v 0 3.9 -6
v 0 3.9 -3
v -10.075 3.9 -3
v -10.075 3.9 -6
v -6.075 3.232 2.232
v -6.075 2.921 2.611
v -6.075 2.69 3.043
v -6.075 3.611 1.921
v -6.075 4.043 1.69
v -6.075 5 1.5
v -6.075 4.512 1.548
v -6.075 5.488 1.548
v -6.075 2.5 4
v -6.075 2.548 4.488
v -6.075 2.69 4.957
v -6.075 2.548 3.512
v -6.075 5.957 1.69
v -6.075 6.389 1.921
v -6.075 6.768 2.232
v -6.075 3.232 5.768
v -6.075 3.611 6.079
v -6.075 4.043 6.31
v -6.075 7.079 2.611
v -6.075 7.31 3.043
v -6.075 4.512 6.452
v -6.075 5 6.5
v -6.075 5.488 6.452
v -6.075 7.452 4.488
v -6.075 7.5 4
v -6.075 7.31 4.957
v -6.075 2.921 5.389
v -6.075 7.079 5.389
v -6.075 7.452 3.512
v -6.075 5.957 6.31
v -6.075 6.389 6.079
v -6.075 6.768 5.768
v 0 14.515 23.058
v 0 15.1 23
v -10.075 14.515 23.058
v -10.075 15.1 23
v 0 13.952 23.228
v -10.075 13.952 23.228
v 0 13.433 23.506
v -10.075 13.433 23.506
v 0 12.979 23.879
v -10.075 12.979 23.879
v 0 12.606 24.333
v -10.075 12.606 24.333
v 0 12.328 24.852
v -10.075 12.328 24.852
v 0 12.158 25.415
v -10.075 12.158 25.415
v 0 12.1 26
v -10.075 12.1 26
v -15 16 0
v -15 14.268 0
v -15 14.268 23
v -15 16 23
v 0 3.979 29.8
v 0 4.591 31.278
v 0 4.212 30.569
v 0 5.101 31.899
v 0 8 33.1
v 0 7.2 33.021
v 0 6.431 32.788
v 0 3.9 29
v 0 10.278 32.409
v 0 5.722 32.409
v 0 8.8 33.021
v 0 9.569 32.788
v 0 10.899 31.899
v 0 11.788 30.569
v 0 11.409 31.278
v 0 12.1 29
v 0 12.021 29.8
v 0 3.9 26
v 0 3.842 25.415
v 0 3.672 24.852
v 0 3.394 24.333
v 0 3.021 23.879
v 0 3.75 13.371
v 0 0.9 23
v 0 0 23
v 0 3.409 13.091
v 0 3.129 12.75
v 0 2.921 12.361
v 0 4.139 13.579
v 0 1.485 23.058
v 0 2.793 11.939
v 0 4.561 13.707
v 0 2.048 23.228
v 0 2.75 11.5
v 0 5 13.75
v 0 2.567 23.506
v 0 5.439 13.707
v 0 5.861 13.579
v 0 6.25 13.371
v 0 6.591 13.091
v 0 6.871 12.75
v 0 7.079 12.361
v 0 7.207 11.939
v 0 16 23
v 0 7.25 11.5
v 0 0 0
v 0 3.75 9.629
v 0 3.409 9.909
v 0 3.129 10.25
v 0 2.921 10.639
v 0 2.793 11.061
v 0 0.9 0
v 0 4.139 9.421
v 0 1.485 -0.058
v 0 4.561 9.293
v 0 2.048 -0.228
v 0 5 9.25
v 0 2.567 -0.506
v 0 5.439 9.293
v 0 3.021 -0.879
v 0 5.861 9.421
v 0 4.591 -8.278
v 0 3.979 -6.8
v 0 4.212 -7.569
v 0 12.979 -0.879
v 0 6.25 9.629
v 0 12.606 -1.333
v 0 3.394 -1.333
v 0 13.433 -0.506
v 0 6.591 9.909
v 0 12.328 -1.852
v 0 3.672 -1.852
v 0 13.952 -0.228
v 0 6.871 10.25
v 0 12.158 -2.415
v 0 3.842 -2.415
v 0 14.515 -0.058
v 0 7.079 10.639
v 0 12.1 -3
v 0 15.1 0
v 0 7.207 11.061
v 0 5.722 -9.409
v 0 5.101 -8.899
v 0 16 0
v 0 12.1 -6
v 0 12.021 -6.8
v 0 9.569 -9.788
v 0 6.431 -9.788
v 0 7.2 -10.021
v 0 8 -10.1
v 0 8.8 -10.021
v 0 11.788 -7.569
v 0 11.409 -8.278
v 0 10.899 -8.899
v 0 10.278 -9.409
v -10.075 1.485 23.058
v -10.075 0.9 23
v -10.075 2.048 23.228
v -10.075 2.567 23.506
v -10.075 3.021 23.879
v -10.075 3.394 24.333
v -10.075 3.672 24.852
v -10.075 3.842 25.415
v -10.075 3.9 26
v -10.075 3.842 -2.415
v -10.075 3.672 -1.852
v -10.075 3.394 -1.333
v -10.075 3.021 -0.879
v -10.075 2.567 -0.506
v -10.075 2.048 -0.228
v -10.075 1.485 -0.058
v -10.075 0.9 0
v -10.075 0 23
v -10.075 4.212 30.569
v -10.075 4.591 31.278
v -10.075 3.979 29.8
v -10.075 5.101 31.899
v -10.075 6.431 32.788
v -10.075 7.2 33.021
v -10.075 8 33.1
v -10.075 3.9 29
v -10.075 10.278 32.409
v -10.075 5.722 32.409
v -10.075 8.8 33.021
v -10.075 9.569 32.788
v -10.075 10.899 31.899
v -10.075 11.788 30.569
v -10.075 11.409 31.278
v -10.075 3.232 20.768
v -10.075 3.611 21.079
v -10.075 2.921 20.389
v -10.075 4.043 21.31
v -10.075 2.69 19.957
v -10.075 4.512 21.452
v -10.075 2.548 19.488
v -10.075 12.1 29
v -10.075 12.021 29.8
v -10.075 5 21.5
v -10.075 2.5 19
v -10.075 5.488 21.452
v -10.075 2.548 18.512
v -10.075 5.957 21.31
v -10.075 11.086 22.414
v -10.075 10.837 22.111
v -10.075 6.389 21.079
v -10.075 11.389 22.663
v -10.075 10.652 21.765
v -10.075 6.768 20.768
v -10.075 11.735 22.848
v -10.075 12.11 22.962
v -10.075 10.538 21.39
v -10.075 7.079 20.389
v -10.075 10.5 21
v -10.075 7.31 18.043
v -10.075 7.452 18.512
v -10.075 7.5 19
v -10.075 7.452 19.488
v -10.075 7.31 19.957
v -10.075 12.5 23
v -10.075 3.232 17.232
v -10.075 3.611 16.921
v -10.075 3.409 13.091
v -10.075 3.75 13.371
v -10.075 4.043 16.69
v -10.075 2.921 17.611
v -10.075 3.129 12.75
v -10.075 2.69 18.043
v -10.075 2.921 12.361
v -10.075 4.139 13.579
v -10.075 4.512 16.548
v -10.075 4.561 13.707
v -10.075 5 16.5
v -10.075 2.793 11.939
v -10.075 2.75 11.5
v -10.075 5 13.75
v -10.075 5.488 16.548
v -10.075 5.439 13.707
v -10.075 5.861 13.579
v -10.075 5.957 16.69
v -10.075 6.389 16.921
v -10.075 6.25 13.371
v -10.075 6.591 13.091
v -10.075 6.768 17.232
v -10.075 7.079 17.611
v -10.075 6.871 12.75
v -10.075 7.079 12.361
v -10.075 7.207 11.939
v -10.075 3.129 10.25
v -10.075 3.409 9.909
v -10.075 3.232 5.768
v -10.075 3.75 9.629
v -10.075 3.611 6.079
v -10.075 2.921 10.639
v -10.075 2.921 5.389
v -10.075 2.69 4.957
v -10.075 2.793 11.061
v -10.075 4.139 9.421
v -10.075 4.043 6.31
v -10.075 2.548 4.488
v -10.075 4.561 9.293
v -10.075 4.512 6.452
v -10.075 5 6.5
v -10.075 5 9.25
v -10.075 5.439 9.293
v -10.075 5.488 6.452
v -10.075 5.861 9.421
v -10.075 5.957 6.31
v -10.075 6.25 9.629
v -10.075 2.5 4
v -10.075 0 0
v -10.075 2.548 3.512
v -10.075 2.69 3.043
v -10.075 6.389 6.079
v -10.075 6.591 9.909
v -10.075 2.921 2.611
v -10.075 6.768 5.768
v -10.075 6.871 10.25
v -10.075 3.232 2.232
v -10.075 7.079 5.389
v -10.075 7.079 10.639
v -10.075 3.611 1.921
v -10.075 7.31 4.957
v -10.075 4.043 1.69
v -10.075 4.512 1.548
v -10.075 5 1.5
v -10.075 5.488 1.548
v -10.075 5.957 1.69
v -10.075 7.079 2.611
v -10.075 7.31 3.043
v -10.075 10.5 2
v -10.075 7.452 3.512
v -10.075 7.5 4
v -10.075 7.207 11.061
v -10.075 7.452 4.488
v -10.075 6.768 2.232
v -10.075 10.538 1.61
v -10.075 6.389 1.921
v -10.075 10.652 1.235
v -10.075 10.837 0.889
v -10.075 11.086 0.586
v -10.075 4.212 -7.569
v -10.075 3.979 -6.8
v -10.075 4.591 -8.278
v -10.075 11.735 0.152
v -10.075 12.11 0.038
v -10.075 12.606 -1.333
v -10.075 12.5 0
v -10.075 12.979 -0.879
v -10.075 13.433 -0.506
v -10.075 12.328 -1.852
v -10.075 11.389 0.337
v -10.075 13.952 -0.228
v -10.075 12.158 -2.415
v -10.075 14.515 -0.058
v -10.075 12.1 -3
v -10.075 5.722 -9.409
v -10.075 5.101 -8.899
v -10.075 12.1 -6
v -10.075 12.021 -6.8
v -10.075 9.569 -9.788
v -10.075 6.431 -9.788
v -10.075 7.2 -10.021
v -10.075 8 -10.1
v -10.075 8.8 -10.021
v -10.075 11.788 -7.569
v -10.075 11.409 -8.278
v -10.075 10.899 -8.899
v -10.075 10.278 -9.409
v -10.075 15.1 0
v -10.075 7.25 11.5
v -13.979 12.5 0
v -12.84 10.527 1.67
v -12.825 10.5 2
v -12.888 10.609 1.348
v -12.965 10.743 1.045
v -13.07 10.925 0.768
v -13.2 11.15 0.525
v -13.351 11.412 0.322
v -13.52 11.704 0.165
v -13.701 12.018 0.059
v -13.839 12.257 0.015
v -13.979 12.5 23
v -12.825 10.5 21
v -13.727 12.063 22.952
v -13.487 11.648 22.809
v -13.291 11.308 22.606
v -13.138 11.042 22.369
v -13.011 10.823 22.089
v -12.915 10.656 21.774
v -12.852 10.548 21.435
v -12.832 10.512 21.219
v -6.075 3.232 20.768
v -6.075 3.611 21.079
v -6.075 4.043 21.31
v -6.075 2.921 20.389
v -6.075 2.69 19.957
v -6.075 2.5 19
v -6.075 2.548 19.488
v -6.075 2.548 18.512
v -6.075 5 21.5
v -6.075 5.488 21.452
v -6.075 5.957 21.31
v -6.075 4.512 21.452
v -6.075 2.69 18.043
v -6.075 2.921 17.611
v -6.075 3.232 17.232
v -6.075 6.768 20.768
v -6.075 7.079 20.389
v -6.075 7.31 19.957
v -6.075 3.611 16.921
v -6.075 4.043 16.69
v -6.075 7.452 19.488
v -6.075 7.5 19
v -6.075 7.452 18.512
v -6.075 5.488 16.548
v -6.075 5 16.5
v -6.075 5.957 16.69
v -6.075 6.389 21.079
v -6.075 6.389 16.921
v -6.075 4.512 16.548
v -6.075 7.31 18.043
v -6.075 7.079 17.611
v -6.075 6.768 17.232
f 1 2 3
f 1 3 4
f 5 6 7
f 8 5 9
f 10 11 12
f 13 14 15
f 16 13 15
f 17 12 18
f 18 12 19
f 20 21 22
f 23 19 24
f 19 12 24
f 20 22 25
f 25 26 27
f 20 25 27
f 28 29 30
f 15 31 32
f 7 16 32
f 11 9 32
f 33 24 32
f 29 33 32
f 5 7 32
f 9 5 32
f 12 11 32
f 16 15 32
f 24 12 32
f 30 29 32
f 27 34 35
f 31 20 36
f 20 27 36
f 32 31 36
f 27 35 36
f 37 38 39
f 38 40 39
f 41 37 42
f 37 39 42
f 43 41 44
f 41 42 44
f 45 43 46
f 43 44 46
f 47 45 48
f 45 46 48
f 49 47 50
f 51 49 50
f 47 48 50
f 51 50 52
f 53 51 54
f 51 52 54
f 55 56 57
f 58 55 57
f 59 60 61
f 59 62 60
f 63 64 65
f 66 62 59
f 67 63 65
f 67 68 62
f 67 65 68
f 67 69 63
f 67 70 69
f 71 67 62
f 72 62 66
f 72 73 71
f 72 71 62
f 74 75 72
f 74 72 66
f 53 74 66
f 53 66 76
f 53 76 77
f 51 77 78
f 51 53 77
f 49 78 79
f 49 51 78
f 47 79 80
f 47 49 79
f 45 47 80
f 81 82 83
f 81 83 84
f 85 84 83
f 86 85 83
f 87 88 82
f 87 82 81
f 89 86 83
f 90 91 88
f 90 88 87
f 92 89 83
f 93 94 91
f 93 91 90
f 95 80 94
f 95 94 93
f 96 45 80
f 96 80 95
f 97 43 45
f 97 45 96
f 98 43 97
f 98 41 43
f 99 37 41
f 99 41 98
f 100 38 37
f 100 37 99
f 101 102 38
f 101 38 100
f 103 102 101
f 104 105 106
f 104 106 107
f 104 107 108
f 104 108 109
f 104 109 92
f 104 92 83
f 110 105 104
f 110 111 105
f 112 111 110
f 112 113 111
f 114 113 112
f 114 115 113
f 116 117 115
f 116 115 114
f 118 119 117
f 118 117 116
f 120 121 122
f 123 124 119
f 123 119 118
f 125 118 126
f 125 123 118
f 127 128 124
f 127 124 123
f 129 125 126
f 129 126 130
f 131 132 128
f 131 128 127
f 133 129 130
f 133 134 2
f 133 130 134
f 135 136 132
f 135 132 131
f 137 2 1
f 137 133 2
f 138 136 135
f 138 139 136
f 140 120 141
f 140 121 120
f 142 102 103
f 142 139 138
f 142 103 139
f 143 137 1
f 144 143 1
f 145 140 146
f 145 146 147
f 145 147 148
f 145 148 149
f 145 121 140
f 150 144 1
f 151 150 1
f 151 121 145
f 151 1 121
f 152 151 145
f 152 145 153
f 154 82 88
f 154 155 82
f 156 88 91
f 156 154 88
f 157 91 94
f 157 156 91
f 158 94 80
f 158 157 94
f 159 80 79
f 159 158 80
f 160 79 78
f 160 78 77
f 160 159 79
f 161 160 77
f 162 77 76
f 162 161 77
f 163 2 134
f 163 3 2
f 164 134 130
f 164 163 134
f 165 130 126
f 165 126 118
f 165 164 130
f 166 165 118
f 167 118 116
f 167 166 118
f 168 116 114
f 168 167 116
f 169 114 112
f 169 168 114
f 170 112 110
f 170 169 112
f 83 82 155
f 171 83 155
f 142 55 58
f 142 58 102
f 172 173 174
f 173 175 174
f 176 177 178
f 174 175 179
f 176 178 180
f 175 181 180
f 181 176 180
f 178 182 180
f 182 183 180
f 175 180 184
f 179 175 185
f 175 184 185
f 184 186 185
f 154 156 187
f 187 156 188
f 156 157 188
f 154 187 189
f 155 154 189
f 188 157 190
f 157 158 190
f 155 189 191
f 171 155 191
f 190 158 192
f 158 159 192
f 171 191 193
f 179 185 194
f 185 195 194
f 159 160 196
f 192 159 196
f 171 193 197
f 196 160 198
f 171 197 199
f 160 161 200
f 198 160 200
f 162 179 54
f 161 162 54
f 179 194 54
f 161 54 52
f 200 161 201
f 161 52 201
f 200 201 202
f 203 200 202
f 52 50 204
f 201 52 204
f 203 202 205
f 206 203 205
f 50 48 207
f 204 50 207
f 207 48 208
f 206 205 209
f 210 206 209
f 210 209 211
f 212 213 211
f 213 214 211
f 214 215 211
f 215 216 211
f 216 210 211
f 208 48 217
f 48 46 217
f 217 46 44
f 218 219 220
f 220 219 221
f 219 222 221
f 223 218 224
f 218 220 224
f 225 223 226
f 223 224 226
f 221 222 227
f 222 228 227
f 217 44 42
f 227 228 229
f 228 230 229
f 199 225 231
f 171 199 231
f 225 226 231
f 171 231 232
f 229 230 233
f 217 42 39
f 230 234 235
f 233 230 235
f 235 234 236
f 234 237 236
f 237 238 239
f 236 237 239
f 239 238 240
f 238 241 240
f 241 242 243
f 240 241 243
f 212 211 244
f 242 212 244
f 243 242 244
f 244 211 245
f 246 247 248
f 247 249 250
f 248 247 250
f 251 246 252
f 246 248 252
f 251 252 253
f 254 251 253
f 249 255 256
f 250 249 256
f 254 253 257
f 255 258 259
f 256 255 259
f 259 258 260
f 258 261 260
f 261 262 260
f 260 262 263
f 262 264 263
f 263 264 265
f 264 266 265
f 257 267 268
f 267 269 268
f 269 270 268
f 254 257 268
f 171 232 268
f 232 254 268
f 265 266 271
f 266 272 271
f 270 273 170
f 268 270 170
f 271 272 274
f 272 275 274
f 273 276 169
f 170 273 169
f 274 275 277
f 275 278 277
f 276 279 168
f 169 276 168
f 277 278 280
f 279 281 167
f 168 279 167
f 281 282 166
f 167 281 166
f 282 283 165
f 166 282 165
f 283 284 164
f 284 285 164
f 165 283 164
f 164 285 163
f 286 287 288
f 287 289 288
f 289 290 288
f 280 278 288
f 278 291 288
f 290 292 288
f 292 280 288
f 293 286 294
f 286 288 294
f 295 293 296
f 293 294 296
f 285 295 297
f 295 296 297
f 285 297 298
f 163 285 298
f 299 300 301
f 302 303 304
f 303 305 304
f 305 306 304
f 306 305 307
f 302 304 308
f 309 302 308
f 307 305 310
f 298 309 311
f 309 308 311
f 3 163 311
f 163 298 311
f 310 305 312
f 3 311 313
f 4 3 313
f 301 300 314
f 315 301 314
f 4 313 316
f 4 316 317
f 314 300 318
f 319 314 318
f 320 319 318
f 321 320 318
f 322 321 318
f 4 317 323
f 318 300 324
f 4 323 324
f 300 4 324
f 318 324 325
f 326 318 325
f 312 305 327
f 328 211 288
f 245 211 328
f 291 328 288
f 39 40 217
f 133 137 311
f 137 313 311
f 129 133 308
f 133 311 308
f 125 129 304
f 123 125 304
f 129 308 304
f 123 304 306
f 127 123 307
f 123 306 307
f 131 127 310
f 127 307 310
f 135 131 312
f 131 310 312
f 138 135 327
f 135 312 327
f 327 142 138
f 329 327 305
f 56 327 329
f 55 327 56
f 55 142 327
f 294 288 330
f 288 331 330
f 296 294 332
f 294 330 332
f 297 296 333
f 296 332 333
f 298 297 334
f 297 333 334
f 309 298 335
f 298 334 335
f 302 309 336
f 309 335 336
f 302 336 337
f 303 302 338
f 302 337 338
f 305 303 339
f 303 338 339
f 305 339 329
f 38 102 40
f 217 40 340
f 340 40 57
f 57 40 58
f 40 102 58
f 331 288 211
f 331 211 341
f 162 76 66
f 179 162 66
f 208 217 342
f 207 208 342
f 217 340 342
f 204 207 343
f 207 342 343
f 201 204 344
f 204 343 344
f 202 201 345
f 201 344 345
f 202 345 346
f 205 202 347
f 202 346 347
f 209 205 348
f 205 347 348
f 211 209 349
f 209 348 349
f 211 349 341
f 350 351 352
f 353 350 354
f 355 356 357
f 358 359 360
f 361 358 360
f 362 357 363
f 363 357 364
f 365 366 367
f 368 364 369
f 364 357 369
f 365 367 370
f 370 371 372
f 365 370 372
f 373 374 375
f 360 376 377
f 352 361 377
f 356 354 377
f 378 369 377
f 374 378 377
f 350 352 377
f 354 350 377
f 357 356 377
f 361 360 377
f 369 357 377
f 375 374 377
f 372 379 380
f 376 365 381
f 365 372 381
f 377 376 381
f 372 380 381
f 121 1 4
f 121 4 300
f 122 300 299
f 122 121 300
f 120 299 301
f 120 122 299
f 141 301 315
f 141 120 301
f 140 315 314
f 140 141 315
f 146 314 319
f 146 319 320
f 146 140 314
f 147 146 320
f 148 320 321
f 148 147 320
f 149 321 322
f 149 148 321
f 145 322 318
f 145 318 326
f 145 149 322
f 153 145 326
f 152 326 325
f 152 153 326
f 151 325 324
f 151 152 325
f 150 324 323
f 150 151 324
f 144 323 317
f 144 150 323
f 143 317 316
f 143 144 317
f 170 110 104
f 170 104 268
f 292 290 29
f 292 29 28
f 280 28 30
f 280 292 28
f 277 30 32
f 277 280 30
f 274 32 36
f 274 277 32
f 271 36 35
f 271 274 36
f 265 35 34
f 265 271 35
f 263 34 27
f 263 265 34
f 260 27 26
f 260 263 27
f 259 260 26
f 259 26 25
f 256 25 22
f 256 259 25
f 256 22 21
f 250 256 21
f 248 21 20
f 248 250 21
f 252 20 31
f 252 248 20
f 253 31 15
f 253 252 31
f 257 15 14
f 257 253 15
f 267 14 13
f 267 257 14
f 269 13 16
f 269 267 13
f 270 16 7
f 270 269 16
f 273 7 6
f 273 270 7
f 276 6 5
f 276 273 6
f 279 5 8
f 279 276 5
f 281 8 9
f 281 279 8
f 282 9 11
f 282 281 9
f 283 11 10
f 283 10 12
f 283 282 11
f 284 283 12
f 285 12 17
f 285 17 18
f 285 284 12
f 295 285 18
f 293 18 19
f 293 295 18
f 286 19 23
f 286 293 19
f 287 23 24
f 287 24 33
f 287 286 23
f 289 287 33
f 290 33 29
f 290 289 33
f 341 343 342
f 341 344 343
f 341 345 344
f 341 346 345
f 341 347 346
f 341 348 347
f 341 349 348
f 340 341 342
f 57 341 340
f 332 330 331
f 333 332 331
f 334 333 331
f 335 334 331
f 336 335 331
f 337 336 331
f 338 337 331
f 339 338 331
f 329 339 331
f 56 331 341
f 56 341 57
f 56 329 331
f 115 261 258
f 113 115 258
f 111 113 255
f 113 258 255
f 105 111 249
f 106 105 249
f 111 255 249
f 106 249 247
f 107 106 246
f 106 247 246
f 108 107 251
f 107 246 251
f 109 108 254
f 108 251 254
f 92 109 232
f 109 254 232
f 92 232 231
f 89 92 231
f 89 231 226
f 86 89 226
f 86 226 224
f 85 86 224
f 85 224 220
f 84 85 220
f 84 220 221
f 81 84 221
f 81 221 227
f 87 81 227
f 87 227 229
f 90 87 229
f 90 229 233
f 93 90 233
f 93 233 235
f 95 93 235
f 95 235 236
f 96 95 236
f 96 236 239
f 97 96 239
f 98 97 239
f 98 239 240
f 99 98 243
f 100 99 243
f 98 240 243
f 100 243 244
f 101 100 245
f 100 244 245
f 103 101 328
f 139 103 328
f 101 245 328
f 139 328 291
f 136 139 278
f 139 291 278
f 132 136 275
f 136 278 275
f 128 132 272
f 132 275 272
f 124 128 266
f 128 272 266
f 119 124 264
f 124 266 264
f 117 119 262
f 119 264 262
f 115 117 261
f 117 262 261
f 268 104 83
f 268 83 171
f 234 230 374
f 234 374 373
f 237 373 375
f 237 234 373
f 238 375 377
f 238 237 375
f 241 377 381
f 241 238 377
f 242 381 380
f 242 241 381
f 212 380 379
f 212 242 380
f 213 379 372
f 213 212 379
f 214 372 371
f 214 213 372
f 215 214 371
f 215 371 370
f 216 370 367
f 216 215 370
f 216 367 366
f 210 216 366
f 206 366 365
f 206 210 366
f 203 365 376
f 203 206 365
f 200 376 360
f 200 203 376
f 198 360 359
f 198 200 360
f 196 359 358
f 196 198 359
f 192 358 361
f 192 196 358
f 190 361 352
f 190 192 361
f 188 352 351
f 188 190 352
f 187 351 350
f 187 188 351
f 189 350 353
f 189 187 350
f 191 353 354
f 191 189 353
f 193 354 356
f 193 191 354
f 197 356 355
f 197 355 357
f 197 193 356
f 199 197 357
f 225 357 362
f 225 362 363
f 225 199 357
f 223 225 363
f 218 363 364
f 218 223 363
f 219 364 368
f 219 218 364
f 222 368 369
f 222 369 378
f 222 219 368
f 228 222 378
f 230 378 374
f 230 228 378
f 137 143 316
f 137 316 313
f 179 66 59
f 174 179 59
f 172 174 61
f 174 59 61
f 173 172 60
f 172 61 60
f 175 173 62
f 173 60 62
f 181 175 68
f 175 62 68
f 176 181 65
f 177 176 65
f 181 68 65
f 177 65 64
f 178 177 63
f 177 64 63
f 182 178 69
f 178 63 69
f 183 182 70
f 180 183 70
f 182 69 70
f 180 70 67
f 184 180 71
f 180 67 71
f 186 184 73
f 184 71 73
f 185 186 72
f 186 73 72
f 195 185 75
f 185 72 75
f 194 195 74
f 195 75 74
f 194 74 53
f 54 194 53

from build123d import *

# Parameters (mm, degrees)
EXTRUDE_1_DEPTH          = 23
SKETCH_2_R               = 2.5
CUT_EXTRUDE_1_DEPTH      = 4
CUT_EXTRUDE_1_DEPTH_BACK = 30.774100013
HOLE_WIZARD_M41_D        = 4.5
CHAMFER_1_SIZE           = 1
CHAMFER_1_SIZE2          = 2
EXTRUDE_2_DEPTH          = 10.074573519
FILLET_1_R               = 3
FILLET_2_R               = 2


with BuildPart() as part:
    # Эскиз1 → Бобышка-Вытянуть1 (new body)
    with BuildSketch(Plane.XY):
        Polygon((0, 0), (-10.074573519, 0), (-10.074573519, 10.5), (-12.824573519, 10.5), (-16, 16), (0, 16), align=None)
    extrude(amount=EXTRUDE_1_DEPTH)

    # Эскиз2 → Вырез-Вытянуть1 (cut, two sides)
    with BuildSketch(Plane(origin=(-10.074573519, 0, 0), x_dir=(0, 0, -1), z_dir=(1, 0, 0))) as cut_extrude_1_sk:
        with Locations((-19, 5)):
            Circle(SKETCH_2_R)
        with Locations(Location((-4, 5, 0), (0, 0, 90))):
            Circle(SKETCH_2_R)
    extrude(amount=CUT_EXTRUDE_1_DEPTH, mode=Mode.SUBTRACT)
    extrude(cut_extrude_1_sk.sketch, amount=-CUT_EXTRUDE_1_DEPTH_BACK, mode=Mode.SUBTRACT)

    # Отверстие с зазором M41 (through all)
    with Locations(Plane(origin=(0, 1.542761086, 4.525415006), x_dir=(0, 0, 1), z_dir=(1, 0, 0))):
        with Locations((6.974584994, -3.457238914)):
            Hole(HOLE_WIZARD_M41_D / 2)

    # Фаска1
    chamfer_1_edges = [part.edges().sort_by_distance(p)[0] for p in [
        (-16, 16, 11.5),
    ]]
    chamfer_1_side = [part.faces().sort_by_distance(p)[0] for p in [
        (-8, 16, 11.5),
    ]]
    chamfer(chamfer_1_edges, length=CHAMFER_1_SIZE, length2=CHAMFER_1_SIZE2, reference=chamfer_1_side[0])

    # Эскиз7 → Бобышка-Вытянуть2 (add)
    with BuildSketch(Plane.ZY):
        with BuildLine():
            Line((-6, 12.1), (0, 12.1))
            Line((0, 12.1), (0, 3.9))
            Line((0, 3.9), (-6, 3.9))
            ThreePointArc((-6, 3.9), (-10.1, 8), (-6, 12.1))
        make_face()
        with BuildLine():
            Line((23, 12.1), (23, 3.9))
            Line((23, 3.9), (29, 3.9))
            ThreePointArc((29, 3.9), (33.1, 8), (29, 12.1))
            Line((29, 12.1), (23, 12.1))
        make_face()
    extrude(amount=EXTRUDE_2_DEPTH)

    # Скругление1
    fillet_1_edges = [part.edges().sort_by_distance(p)[0] for p in [
        (-5.037286759, 3.9, 23),
        (-5.03728676, 12.1, 23),
        (-5.03728676, 12.1, 0),
        (-5.037286759, 3.9, 0),
    ]]
    fillet(fillet_1_edges, radius=FILLET_1_R)

    # Скругление2
    fillet_2_edges = [part.edges().sort_by_distance(p)[0] for p in [
        (-11.449573519, 10.5, 23),
        (-11.449573519, 10.5, 0),
    ]]
    fillet(fillet_2_edges, radius=FILLET_2_R)


solid = part.part
